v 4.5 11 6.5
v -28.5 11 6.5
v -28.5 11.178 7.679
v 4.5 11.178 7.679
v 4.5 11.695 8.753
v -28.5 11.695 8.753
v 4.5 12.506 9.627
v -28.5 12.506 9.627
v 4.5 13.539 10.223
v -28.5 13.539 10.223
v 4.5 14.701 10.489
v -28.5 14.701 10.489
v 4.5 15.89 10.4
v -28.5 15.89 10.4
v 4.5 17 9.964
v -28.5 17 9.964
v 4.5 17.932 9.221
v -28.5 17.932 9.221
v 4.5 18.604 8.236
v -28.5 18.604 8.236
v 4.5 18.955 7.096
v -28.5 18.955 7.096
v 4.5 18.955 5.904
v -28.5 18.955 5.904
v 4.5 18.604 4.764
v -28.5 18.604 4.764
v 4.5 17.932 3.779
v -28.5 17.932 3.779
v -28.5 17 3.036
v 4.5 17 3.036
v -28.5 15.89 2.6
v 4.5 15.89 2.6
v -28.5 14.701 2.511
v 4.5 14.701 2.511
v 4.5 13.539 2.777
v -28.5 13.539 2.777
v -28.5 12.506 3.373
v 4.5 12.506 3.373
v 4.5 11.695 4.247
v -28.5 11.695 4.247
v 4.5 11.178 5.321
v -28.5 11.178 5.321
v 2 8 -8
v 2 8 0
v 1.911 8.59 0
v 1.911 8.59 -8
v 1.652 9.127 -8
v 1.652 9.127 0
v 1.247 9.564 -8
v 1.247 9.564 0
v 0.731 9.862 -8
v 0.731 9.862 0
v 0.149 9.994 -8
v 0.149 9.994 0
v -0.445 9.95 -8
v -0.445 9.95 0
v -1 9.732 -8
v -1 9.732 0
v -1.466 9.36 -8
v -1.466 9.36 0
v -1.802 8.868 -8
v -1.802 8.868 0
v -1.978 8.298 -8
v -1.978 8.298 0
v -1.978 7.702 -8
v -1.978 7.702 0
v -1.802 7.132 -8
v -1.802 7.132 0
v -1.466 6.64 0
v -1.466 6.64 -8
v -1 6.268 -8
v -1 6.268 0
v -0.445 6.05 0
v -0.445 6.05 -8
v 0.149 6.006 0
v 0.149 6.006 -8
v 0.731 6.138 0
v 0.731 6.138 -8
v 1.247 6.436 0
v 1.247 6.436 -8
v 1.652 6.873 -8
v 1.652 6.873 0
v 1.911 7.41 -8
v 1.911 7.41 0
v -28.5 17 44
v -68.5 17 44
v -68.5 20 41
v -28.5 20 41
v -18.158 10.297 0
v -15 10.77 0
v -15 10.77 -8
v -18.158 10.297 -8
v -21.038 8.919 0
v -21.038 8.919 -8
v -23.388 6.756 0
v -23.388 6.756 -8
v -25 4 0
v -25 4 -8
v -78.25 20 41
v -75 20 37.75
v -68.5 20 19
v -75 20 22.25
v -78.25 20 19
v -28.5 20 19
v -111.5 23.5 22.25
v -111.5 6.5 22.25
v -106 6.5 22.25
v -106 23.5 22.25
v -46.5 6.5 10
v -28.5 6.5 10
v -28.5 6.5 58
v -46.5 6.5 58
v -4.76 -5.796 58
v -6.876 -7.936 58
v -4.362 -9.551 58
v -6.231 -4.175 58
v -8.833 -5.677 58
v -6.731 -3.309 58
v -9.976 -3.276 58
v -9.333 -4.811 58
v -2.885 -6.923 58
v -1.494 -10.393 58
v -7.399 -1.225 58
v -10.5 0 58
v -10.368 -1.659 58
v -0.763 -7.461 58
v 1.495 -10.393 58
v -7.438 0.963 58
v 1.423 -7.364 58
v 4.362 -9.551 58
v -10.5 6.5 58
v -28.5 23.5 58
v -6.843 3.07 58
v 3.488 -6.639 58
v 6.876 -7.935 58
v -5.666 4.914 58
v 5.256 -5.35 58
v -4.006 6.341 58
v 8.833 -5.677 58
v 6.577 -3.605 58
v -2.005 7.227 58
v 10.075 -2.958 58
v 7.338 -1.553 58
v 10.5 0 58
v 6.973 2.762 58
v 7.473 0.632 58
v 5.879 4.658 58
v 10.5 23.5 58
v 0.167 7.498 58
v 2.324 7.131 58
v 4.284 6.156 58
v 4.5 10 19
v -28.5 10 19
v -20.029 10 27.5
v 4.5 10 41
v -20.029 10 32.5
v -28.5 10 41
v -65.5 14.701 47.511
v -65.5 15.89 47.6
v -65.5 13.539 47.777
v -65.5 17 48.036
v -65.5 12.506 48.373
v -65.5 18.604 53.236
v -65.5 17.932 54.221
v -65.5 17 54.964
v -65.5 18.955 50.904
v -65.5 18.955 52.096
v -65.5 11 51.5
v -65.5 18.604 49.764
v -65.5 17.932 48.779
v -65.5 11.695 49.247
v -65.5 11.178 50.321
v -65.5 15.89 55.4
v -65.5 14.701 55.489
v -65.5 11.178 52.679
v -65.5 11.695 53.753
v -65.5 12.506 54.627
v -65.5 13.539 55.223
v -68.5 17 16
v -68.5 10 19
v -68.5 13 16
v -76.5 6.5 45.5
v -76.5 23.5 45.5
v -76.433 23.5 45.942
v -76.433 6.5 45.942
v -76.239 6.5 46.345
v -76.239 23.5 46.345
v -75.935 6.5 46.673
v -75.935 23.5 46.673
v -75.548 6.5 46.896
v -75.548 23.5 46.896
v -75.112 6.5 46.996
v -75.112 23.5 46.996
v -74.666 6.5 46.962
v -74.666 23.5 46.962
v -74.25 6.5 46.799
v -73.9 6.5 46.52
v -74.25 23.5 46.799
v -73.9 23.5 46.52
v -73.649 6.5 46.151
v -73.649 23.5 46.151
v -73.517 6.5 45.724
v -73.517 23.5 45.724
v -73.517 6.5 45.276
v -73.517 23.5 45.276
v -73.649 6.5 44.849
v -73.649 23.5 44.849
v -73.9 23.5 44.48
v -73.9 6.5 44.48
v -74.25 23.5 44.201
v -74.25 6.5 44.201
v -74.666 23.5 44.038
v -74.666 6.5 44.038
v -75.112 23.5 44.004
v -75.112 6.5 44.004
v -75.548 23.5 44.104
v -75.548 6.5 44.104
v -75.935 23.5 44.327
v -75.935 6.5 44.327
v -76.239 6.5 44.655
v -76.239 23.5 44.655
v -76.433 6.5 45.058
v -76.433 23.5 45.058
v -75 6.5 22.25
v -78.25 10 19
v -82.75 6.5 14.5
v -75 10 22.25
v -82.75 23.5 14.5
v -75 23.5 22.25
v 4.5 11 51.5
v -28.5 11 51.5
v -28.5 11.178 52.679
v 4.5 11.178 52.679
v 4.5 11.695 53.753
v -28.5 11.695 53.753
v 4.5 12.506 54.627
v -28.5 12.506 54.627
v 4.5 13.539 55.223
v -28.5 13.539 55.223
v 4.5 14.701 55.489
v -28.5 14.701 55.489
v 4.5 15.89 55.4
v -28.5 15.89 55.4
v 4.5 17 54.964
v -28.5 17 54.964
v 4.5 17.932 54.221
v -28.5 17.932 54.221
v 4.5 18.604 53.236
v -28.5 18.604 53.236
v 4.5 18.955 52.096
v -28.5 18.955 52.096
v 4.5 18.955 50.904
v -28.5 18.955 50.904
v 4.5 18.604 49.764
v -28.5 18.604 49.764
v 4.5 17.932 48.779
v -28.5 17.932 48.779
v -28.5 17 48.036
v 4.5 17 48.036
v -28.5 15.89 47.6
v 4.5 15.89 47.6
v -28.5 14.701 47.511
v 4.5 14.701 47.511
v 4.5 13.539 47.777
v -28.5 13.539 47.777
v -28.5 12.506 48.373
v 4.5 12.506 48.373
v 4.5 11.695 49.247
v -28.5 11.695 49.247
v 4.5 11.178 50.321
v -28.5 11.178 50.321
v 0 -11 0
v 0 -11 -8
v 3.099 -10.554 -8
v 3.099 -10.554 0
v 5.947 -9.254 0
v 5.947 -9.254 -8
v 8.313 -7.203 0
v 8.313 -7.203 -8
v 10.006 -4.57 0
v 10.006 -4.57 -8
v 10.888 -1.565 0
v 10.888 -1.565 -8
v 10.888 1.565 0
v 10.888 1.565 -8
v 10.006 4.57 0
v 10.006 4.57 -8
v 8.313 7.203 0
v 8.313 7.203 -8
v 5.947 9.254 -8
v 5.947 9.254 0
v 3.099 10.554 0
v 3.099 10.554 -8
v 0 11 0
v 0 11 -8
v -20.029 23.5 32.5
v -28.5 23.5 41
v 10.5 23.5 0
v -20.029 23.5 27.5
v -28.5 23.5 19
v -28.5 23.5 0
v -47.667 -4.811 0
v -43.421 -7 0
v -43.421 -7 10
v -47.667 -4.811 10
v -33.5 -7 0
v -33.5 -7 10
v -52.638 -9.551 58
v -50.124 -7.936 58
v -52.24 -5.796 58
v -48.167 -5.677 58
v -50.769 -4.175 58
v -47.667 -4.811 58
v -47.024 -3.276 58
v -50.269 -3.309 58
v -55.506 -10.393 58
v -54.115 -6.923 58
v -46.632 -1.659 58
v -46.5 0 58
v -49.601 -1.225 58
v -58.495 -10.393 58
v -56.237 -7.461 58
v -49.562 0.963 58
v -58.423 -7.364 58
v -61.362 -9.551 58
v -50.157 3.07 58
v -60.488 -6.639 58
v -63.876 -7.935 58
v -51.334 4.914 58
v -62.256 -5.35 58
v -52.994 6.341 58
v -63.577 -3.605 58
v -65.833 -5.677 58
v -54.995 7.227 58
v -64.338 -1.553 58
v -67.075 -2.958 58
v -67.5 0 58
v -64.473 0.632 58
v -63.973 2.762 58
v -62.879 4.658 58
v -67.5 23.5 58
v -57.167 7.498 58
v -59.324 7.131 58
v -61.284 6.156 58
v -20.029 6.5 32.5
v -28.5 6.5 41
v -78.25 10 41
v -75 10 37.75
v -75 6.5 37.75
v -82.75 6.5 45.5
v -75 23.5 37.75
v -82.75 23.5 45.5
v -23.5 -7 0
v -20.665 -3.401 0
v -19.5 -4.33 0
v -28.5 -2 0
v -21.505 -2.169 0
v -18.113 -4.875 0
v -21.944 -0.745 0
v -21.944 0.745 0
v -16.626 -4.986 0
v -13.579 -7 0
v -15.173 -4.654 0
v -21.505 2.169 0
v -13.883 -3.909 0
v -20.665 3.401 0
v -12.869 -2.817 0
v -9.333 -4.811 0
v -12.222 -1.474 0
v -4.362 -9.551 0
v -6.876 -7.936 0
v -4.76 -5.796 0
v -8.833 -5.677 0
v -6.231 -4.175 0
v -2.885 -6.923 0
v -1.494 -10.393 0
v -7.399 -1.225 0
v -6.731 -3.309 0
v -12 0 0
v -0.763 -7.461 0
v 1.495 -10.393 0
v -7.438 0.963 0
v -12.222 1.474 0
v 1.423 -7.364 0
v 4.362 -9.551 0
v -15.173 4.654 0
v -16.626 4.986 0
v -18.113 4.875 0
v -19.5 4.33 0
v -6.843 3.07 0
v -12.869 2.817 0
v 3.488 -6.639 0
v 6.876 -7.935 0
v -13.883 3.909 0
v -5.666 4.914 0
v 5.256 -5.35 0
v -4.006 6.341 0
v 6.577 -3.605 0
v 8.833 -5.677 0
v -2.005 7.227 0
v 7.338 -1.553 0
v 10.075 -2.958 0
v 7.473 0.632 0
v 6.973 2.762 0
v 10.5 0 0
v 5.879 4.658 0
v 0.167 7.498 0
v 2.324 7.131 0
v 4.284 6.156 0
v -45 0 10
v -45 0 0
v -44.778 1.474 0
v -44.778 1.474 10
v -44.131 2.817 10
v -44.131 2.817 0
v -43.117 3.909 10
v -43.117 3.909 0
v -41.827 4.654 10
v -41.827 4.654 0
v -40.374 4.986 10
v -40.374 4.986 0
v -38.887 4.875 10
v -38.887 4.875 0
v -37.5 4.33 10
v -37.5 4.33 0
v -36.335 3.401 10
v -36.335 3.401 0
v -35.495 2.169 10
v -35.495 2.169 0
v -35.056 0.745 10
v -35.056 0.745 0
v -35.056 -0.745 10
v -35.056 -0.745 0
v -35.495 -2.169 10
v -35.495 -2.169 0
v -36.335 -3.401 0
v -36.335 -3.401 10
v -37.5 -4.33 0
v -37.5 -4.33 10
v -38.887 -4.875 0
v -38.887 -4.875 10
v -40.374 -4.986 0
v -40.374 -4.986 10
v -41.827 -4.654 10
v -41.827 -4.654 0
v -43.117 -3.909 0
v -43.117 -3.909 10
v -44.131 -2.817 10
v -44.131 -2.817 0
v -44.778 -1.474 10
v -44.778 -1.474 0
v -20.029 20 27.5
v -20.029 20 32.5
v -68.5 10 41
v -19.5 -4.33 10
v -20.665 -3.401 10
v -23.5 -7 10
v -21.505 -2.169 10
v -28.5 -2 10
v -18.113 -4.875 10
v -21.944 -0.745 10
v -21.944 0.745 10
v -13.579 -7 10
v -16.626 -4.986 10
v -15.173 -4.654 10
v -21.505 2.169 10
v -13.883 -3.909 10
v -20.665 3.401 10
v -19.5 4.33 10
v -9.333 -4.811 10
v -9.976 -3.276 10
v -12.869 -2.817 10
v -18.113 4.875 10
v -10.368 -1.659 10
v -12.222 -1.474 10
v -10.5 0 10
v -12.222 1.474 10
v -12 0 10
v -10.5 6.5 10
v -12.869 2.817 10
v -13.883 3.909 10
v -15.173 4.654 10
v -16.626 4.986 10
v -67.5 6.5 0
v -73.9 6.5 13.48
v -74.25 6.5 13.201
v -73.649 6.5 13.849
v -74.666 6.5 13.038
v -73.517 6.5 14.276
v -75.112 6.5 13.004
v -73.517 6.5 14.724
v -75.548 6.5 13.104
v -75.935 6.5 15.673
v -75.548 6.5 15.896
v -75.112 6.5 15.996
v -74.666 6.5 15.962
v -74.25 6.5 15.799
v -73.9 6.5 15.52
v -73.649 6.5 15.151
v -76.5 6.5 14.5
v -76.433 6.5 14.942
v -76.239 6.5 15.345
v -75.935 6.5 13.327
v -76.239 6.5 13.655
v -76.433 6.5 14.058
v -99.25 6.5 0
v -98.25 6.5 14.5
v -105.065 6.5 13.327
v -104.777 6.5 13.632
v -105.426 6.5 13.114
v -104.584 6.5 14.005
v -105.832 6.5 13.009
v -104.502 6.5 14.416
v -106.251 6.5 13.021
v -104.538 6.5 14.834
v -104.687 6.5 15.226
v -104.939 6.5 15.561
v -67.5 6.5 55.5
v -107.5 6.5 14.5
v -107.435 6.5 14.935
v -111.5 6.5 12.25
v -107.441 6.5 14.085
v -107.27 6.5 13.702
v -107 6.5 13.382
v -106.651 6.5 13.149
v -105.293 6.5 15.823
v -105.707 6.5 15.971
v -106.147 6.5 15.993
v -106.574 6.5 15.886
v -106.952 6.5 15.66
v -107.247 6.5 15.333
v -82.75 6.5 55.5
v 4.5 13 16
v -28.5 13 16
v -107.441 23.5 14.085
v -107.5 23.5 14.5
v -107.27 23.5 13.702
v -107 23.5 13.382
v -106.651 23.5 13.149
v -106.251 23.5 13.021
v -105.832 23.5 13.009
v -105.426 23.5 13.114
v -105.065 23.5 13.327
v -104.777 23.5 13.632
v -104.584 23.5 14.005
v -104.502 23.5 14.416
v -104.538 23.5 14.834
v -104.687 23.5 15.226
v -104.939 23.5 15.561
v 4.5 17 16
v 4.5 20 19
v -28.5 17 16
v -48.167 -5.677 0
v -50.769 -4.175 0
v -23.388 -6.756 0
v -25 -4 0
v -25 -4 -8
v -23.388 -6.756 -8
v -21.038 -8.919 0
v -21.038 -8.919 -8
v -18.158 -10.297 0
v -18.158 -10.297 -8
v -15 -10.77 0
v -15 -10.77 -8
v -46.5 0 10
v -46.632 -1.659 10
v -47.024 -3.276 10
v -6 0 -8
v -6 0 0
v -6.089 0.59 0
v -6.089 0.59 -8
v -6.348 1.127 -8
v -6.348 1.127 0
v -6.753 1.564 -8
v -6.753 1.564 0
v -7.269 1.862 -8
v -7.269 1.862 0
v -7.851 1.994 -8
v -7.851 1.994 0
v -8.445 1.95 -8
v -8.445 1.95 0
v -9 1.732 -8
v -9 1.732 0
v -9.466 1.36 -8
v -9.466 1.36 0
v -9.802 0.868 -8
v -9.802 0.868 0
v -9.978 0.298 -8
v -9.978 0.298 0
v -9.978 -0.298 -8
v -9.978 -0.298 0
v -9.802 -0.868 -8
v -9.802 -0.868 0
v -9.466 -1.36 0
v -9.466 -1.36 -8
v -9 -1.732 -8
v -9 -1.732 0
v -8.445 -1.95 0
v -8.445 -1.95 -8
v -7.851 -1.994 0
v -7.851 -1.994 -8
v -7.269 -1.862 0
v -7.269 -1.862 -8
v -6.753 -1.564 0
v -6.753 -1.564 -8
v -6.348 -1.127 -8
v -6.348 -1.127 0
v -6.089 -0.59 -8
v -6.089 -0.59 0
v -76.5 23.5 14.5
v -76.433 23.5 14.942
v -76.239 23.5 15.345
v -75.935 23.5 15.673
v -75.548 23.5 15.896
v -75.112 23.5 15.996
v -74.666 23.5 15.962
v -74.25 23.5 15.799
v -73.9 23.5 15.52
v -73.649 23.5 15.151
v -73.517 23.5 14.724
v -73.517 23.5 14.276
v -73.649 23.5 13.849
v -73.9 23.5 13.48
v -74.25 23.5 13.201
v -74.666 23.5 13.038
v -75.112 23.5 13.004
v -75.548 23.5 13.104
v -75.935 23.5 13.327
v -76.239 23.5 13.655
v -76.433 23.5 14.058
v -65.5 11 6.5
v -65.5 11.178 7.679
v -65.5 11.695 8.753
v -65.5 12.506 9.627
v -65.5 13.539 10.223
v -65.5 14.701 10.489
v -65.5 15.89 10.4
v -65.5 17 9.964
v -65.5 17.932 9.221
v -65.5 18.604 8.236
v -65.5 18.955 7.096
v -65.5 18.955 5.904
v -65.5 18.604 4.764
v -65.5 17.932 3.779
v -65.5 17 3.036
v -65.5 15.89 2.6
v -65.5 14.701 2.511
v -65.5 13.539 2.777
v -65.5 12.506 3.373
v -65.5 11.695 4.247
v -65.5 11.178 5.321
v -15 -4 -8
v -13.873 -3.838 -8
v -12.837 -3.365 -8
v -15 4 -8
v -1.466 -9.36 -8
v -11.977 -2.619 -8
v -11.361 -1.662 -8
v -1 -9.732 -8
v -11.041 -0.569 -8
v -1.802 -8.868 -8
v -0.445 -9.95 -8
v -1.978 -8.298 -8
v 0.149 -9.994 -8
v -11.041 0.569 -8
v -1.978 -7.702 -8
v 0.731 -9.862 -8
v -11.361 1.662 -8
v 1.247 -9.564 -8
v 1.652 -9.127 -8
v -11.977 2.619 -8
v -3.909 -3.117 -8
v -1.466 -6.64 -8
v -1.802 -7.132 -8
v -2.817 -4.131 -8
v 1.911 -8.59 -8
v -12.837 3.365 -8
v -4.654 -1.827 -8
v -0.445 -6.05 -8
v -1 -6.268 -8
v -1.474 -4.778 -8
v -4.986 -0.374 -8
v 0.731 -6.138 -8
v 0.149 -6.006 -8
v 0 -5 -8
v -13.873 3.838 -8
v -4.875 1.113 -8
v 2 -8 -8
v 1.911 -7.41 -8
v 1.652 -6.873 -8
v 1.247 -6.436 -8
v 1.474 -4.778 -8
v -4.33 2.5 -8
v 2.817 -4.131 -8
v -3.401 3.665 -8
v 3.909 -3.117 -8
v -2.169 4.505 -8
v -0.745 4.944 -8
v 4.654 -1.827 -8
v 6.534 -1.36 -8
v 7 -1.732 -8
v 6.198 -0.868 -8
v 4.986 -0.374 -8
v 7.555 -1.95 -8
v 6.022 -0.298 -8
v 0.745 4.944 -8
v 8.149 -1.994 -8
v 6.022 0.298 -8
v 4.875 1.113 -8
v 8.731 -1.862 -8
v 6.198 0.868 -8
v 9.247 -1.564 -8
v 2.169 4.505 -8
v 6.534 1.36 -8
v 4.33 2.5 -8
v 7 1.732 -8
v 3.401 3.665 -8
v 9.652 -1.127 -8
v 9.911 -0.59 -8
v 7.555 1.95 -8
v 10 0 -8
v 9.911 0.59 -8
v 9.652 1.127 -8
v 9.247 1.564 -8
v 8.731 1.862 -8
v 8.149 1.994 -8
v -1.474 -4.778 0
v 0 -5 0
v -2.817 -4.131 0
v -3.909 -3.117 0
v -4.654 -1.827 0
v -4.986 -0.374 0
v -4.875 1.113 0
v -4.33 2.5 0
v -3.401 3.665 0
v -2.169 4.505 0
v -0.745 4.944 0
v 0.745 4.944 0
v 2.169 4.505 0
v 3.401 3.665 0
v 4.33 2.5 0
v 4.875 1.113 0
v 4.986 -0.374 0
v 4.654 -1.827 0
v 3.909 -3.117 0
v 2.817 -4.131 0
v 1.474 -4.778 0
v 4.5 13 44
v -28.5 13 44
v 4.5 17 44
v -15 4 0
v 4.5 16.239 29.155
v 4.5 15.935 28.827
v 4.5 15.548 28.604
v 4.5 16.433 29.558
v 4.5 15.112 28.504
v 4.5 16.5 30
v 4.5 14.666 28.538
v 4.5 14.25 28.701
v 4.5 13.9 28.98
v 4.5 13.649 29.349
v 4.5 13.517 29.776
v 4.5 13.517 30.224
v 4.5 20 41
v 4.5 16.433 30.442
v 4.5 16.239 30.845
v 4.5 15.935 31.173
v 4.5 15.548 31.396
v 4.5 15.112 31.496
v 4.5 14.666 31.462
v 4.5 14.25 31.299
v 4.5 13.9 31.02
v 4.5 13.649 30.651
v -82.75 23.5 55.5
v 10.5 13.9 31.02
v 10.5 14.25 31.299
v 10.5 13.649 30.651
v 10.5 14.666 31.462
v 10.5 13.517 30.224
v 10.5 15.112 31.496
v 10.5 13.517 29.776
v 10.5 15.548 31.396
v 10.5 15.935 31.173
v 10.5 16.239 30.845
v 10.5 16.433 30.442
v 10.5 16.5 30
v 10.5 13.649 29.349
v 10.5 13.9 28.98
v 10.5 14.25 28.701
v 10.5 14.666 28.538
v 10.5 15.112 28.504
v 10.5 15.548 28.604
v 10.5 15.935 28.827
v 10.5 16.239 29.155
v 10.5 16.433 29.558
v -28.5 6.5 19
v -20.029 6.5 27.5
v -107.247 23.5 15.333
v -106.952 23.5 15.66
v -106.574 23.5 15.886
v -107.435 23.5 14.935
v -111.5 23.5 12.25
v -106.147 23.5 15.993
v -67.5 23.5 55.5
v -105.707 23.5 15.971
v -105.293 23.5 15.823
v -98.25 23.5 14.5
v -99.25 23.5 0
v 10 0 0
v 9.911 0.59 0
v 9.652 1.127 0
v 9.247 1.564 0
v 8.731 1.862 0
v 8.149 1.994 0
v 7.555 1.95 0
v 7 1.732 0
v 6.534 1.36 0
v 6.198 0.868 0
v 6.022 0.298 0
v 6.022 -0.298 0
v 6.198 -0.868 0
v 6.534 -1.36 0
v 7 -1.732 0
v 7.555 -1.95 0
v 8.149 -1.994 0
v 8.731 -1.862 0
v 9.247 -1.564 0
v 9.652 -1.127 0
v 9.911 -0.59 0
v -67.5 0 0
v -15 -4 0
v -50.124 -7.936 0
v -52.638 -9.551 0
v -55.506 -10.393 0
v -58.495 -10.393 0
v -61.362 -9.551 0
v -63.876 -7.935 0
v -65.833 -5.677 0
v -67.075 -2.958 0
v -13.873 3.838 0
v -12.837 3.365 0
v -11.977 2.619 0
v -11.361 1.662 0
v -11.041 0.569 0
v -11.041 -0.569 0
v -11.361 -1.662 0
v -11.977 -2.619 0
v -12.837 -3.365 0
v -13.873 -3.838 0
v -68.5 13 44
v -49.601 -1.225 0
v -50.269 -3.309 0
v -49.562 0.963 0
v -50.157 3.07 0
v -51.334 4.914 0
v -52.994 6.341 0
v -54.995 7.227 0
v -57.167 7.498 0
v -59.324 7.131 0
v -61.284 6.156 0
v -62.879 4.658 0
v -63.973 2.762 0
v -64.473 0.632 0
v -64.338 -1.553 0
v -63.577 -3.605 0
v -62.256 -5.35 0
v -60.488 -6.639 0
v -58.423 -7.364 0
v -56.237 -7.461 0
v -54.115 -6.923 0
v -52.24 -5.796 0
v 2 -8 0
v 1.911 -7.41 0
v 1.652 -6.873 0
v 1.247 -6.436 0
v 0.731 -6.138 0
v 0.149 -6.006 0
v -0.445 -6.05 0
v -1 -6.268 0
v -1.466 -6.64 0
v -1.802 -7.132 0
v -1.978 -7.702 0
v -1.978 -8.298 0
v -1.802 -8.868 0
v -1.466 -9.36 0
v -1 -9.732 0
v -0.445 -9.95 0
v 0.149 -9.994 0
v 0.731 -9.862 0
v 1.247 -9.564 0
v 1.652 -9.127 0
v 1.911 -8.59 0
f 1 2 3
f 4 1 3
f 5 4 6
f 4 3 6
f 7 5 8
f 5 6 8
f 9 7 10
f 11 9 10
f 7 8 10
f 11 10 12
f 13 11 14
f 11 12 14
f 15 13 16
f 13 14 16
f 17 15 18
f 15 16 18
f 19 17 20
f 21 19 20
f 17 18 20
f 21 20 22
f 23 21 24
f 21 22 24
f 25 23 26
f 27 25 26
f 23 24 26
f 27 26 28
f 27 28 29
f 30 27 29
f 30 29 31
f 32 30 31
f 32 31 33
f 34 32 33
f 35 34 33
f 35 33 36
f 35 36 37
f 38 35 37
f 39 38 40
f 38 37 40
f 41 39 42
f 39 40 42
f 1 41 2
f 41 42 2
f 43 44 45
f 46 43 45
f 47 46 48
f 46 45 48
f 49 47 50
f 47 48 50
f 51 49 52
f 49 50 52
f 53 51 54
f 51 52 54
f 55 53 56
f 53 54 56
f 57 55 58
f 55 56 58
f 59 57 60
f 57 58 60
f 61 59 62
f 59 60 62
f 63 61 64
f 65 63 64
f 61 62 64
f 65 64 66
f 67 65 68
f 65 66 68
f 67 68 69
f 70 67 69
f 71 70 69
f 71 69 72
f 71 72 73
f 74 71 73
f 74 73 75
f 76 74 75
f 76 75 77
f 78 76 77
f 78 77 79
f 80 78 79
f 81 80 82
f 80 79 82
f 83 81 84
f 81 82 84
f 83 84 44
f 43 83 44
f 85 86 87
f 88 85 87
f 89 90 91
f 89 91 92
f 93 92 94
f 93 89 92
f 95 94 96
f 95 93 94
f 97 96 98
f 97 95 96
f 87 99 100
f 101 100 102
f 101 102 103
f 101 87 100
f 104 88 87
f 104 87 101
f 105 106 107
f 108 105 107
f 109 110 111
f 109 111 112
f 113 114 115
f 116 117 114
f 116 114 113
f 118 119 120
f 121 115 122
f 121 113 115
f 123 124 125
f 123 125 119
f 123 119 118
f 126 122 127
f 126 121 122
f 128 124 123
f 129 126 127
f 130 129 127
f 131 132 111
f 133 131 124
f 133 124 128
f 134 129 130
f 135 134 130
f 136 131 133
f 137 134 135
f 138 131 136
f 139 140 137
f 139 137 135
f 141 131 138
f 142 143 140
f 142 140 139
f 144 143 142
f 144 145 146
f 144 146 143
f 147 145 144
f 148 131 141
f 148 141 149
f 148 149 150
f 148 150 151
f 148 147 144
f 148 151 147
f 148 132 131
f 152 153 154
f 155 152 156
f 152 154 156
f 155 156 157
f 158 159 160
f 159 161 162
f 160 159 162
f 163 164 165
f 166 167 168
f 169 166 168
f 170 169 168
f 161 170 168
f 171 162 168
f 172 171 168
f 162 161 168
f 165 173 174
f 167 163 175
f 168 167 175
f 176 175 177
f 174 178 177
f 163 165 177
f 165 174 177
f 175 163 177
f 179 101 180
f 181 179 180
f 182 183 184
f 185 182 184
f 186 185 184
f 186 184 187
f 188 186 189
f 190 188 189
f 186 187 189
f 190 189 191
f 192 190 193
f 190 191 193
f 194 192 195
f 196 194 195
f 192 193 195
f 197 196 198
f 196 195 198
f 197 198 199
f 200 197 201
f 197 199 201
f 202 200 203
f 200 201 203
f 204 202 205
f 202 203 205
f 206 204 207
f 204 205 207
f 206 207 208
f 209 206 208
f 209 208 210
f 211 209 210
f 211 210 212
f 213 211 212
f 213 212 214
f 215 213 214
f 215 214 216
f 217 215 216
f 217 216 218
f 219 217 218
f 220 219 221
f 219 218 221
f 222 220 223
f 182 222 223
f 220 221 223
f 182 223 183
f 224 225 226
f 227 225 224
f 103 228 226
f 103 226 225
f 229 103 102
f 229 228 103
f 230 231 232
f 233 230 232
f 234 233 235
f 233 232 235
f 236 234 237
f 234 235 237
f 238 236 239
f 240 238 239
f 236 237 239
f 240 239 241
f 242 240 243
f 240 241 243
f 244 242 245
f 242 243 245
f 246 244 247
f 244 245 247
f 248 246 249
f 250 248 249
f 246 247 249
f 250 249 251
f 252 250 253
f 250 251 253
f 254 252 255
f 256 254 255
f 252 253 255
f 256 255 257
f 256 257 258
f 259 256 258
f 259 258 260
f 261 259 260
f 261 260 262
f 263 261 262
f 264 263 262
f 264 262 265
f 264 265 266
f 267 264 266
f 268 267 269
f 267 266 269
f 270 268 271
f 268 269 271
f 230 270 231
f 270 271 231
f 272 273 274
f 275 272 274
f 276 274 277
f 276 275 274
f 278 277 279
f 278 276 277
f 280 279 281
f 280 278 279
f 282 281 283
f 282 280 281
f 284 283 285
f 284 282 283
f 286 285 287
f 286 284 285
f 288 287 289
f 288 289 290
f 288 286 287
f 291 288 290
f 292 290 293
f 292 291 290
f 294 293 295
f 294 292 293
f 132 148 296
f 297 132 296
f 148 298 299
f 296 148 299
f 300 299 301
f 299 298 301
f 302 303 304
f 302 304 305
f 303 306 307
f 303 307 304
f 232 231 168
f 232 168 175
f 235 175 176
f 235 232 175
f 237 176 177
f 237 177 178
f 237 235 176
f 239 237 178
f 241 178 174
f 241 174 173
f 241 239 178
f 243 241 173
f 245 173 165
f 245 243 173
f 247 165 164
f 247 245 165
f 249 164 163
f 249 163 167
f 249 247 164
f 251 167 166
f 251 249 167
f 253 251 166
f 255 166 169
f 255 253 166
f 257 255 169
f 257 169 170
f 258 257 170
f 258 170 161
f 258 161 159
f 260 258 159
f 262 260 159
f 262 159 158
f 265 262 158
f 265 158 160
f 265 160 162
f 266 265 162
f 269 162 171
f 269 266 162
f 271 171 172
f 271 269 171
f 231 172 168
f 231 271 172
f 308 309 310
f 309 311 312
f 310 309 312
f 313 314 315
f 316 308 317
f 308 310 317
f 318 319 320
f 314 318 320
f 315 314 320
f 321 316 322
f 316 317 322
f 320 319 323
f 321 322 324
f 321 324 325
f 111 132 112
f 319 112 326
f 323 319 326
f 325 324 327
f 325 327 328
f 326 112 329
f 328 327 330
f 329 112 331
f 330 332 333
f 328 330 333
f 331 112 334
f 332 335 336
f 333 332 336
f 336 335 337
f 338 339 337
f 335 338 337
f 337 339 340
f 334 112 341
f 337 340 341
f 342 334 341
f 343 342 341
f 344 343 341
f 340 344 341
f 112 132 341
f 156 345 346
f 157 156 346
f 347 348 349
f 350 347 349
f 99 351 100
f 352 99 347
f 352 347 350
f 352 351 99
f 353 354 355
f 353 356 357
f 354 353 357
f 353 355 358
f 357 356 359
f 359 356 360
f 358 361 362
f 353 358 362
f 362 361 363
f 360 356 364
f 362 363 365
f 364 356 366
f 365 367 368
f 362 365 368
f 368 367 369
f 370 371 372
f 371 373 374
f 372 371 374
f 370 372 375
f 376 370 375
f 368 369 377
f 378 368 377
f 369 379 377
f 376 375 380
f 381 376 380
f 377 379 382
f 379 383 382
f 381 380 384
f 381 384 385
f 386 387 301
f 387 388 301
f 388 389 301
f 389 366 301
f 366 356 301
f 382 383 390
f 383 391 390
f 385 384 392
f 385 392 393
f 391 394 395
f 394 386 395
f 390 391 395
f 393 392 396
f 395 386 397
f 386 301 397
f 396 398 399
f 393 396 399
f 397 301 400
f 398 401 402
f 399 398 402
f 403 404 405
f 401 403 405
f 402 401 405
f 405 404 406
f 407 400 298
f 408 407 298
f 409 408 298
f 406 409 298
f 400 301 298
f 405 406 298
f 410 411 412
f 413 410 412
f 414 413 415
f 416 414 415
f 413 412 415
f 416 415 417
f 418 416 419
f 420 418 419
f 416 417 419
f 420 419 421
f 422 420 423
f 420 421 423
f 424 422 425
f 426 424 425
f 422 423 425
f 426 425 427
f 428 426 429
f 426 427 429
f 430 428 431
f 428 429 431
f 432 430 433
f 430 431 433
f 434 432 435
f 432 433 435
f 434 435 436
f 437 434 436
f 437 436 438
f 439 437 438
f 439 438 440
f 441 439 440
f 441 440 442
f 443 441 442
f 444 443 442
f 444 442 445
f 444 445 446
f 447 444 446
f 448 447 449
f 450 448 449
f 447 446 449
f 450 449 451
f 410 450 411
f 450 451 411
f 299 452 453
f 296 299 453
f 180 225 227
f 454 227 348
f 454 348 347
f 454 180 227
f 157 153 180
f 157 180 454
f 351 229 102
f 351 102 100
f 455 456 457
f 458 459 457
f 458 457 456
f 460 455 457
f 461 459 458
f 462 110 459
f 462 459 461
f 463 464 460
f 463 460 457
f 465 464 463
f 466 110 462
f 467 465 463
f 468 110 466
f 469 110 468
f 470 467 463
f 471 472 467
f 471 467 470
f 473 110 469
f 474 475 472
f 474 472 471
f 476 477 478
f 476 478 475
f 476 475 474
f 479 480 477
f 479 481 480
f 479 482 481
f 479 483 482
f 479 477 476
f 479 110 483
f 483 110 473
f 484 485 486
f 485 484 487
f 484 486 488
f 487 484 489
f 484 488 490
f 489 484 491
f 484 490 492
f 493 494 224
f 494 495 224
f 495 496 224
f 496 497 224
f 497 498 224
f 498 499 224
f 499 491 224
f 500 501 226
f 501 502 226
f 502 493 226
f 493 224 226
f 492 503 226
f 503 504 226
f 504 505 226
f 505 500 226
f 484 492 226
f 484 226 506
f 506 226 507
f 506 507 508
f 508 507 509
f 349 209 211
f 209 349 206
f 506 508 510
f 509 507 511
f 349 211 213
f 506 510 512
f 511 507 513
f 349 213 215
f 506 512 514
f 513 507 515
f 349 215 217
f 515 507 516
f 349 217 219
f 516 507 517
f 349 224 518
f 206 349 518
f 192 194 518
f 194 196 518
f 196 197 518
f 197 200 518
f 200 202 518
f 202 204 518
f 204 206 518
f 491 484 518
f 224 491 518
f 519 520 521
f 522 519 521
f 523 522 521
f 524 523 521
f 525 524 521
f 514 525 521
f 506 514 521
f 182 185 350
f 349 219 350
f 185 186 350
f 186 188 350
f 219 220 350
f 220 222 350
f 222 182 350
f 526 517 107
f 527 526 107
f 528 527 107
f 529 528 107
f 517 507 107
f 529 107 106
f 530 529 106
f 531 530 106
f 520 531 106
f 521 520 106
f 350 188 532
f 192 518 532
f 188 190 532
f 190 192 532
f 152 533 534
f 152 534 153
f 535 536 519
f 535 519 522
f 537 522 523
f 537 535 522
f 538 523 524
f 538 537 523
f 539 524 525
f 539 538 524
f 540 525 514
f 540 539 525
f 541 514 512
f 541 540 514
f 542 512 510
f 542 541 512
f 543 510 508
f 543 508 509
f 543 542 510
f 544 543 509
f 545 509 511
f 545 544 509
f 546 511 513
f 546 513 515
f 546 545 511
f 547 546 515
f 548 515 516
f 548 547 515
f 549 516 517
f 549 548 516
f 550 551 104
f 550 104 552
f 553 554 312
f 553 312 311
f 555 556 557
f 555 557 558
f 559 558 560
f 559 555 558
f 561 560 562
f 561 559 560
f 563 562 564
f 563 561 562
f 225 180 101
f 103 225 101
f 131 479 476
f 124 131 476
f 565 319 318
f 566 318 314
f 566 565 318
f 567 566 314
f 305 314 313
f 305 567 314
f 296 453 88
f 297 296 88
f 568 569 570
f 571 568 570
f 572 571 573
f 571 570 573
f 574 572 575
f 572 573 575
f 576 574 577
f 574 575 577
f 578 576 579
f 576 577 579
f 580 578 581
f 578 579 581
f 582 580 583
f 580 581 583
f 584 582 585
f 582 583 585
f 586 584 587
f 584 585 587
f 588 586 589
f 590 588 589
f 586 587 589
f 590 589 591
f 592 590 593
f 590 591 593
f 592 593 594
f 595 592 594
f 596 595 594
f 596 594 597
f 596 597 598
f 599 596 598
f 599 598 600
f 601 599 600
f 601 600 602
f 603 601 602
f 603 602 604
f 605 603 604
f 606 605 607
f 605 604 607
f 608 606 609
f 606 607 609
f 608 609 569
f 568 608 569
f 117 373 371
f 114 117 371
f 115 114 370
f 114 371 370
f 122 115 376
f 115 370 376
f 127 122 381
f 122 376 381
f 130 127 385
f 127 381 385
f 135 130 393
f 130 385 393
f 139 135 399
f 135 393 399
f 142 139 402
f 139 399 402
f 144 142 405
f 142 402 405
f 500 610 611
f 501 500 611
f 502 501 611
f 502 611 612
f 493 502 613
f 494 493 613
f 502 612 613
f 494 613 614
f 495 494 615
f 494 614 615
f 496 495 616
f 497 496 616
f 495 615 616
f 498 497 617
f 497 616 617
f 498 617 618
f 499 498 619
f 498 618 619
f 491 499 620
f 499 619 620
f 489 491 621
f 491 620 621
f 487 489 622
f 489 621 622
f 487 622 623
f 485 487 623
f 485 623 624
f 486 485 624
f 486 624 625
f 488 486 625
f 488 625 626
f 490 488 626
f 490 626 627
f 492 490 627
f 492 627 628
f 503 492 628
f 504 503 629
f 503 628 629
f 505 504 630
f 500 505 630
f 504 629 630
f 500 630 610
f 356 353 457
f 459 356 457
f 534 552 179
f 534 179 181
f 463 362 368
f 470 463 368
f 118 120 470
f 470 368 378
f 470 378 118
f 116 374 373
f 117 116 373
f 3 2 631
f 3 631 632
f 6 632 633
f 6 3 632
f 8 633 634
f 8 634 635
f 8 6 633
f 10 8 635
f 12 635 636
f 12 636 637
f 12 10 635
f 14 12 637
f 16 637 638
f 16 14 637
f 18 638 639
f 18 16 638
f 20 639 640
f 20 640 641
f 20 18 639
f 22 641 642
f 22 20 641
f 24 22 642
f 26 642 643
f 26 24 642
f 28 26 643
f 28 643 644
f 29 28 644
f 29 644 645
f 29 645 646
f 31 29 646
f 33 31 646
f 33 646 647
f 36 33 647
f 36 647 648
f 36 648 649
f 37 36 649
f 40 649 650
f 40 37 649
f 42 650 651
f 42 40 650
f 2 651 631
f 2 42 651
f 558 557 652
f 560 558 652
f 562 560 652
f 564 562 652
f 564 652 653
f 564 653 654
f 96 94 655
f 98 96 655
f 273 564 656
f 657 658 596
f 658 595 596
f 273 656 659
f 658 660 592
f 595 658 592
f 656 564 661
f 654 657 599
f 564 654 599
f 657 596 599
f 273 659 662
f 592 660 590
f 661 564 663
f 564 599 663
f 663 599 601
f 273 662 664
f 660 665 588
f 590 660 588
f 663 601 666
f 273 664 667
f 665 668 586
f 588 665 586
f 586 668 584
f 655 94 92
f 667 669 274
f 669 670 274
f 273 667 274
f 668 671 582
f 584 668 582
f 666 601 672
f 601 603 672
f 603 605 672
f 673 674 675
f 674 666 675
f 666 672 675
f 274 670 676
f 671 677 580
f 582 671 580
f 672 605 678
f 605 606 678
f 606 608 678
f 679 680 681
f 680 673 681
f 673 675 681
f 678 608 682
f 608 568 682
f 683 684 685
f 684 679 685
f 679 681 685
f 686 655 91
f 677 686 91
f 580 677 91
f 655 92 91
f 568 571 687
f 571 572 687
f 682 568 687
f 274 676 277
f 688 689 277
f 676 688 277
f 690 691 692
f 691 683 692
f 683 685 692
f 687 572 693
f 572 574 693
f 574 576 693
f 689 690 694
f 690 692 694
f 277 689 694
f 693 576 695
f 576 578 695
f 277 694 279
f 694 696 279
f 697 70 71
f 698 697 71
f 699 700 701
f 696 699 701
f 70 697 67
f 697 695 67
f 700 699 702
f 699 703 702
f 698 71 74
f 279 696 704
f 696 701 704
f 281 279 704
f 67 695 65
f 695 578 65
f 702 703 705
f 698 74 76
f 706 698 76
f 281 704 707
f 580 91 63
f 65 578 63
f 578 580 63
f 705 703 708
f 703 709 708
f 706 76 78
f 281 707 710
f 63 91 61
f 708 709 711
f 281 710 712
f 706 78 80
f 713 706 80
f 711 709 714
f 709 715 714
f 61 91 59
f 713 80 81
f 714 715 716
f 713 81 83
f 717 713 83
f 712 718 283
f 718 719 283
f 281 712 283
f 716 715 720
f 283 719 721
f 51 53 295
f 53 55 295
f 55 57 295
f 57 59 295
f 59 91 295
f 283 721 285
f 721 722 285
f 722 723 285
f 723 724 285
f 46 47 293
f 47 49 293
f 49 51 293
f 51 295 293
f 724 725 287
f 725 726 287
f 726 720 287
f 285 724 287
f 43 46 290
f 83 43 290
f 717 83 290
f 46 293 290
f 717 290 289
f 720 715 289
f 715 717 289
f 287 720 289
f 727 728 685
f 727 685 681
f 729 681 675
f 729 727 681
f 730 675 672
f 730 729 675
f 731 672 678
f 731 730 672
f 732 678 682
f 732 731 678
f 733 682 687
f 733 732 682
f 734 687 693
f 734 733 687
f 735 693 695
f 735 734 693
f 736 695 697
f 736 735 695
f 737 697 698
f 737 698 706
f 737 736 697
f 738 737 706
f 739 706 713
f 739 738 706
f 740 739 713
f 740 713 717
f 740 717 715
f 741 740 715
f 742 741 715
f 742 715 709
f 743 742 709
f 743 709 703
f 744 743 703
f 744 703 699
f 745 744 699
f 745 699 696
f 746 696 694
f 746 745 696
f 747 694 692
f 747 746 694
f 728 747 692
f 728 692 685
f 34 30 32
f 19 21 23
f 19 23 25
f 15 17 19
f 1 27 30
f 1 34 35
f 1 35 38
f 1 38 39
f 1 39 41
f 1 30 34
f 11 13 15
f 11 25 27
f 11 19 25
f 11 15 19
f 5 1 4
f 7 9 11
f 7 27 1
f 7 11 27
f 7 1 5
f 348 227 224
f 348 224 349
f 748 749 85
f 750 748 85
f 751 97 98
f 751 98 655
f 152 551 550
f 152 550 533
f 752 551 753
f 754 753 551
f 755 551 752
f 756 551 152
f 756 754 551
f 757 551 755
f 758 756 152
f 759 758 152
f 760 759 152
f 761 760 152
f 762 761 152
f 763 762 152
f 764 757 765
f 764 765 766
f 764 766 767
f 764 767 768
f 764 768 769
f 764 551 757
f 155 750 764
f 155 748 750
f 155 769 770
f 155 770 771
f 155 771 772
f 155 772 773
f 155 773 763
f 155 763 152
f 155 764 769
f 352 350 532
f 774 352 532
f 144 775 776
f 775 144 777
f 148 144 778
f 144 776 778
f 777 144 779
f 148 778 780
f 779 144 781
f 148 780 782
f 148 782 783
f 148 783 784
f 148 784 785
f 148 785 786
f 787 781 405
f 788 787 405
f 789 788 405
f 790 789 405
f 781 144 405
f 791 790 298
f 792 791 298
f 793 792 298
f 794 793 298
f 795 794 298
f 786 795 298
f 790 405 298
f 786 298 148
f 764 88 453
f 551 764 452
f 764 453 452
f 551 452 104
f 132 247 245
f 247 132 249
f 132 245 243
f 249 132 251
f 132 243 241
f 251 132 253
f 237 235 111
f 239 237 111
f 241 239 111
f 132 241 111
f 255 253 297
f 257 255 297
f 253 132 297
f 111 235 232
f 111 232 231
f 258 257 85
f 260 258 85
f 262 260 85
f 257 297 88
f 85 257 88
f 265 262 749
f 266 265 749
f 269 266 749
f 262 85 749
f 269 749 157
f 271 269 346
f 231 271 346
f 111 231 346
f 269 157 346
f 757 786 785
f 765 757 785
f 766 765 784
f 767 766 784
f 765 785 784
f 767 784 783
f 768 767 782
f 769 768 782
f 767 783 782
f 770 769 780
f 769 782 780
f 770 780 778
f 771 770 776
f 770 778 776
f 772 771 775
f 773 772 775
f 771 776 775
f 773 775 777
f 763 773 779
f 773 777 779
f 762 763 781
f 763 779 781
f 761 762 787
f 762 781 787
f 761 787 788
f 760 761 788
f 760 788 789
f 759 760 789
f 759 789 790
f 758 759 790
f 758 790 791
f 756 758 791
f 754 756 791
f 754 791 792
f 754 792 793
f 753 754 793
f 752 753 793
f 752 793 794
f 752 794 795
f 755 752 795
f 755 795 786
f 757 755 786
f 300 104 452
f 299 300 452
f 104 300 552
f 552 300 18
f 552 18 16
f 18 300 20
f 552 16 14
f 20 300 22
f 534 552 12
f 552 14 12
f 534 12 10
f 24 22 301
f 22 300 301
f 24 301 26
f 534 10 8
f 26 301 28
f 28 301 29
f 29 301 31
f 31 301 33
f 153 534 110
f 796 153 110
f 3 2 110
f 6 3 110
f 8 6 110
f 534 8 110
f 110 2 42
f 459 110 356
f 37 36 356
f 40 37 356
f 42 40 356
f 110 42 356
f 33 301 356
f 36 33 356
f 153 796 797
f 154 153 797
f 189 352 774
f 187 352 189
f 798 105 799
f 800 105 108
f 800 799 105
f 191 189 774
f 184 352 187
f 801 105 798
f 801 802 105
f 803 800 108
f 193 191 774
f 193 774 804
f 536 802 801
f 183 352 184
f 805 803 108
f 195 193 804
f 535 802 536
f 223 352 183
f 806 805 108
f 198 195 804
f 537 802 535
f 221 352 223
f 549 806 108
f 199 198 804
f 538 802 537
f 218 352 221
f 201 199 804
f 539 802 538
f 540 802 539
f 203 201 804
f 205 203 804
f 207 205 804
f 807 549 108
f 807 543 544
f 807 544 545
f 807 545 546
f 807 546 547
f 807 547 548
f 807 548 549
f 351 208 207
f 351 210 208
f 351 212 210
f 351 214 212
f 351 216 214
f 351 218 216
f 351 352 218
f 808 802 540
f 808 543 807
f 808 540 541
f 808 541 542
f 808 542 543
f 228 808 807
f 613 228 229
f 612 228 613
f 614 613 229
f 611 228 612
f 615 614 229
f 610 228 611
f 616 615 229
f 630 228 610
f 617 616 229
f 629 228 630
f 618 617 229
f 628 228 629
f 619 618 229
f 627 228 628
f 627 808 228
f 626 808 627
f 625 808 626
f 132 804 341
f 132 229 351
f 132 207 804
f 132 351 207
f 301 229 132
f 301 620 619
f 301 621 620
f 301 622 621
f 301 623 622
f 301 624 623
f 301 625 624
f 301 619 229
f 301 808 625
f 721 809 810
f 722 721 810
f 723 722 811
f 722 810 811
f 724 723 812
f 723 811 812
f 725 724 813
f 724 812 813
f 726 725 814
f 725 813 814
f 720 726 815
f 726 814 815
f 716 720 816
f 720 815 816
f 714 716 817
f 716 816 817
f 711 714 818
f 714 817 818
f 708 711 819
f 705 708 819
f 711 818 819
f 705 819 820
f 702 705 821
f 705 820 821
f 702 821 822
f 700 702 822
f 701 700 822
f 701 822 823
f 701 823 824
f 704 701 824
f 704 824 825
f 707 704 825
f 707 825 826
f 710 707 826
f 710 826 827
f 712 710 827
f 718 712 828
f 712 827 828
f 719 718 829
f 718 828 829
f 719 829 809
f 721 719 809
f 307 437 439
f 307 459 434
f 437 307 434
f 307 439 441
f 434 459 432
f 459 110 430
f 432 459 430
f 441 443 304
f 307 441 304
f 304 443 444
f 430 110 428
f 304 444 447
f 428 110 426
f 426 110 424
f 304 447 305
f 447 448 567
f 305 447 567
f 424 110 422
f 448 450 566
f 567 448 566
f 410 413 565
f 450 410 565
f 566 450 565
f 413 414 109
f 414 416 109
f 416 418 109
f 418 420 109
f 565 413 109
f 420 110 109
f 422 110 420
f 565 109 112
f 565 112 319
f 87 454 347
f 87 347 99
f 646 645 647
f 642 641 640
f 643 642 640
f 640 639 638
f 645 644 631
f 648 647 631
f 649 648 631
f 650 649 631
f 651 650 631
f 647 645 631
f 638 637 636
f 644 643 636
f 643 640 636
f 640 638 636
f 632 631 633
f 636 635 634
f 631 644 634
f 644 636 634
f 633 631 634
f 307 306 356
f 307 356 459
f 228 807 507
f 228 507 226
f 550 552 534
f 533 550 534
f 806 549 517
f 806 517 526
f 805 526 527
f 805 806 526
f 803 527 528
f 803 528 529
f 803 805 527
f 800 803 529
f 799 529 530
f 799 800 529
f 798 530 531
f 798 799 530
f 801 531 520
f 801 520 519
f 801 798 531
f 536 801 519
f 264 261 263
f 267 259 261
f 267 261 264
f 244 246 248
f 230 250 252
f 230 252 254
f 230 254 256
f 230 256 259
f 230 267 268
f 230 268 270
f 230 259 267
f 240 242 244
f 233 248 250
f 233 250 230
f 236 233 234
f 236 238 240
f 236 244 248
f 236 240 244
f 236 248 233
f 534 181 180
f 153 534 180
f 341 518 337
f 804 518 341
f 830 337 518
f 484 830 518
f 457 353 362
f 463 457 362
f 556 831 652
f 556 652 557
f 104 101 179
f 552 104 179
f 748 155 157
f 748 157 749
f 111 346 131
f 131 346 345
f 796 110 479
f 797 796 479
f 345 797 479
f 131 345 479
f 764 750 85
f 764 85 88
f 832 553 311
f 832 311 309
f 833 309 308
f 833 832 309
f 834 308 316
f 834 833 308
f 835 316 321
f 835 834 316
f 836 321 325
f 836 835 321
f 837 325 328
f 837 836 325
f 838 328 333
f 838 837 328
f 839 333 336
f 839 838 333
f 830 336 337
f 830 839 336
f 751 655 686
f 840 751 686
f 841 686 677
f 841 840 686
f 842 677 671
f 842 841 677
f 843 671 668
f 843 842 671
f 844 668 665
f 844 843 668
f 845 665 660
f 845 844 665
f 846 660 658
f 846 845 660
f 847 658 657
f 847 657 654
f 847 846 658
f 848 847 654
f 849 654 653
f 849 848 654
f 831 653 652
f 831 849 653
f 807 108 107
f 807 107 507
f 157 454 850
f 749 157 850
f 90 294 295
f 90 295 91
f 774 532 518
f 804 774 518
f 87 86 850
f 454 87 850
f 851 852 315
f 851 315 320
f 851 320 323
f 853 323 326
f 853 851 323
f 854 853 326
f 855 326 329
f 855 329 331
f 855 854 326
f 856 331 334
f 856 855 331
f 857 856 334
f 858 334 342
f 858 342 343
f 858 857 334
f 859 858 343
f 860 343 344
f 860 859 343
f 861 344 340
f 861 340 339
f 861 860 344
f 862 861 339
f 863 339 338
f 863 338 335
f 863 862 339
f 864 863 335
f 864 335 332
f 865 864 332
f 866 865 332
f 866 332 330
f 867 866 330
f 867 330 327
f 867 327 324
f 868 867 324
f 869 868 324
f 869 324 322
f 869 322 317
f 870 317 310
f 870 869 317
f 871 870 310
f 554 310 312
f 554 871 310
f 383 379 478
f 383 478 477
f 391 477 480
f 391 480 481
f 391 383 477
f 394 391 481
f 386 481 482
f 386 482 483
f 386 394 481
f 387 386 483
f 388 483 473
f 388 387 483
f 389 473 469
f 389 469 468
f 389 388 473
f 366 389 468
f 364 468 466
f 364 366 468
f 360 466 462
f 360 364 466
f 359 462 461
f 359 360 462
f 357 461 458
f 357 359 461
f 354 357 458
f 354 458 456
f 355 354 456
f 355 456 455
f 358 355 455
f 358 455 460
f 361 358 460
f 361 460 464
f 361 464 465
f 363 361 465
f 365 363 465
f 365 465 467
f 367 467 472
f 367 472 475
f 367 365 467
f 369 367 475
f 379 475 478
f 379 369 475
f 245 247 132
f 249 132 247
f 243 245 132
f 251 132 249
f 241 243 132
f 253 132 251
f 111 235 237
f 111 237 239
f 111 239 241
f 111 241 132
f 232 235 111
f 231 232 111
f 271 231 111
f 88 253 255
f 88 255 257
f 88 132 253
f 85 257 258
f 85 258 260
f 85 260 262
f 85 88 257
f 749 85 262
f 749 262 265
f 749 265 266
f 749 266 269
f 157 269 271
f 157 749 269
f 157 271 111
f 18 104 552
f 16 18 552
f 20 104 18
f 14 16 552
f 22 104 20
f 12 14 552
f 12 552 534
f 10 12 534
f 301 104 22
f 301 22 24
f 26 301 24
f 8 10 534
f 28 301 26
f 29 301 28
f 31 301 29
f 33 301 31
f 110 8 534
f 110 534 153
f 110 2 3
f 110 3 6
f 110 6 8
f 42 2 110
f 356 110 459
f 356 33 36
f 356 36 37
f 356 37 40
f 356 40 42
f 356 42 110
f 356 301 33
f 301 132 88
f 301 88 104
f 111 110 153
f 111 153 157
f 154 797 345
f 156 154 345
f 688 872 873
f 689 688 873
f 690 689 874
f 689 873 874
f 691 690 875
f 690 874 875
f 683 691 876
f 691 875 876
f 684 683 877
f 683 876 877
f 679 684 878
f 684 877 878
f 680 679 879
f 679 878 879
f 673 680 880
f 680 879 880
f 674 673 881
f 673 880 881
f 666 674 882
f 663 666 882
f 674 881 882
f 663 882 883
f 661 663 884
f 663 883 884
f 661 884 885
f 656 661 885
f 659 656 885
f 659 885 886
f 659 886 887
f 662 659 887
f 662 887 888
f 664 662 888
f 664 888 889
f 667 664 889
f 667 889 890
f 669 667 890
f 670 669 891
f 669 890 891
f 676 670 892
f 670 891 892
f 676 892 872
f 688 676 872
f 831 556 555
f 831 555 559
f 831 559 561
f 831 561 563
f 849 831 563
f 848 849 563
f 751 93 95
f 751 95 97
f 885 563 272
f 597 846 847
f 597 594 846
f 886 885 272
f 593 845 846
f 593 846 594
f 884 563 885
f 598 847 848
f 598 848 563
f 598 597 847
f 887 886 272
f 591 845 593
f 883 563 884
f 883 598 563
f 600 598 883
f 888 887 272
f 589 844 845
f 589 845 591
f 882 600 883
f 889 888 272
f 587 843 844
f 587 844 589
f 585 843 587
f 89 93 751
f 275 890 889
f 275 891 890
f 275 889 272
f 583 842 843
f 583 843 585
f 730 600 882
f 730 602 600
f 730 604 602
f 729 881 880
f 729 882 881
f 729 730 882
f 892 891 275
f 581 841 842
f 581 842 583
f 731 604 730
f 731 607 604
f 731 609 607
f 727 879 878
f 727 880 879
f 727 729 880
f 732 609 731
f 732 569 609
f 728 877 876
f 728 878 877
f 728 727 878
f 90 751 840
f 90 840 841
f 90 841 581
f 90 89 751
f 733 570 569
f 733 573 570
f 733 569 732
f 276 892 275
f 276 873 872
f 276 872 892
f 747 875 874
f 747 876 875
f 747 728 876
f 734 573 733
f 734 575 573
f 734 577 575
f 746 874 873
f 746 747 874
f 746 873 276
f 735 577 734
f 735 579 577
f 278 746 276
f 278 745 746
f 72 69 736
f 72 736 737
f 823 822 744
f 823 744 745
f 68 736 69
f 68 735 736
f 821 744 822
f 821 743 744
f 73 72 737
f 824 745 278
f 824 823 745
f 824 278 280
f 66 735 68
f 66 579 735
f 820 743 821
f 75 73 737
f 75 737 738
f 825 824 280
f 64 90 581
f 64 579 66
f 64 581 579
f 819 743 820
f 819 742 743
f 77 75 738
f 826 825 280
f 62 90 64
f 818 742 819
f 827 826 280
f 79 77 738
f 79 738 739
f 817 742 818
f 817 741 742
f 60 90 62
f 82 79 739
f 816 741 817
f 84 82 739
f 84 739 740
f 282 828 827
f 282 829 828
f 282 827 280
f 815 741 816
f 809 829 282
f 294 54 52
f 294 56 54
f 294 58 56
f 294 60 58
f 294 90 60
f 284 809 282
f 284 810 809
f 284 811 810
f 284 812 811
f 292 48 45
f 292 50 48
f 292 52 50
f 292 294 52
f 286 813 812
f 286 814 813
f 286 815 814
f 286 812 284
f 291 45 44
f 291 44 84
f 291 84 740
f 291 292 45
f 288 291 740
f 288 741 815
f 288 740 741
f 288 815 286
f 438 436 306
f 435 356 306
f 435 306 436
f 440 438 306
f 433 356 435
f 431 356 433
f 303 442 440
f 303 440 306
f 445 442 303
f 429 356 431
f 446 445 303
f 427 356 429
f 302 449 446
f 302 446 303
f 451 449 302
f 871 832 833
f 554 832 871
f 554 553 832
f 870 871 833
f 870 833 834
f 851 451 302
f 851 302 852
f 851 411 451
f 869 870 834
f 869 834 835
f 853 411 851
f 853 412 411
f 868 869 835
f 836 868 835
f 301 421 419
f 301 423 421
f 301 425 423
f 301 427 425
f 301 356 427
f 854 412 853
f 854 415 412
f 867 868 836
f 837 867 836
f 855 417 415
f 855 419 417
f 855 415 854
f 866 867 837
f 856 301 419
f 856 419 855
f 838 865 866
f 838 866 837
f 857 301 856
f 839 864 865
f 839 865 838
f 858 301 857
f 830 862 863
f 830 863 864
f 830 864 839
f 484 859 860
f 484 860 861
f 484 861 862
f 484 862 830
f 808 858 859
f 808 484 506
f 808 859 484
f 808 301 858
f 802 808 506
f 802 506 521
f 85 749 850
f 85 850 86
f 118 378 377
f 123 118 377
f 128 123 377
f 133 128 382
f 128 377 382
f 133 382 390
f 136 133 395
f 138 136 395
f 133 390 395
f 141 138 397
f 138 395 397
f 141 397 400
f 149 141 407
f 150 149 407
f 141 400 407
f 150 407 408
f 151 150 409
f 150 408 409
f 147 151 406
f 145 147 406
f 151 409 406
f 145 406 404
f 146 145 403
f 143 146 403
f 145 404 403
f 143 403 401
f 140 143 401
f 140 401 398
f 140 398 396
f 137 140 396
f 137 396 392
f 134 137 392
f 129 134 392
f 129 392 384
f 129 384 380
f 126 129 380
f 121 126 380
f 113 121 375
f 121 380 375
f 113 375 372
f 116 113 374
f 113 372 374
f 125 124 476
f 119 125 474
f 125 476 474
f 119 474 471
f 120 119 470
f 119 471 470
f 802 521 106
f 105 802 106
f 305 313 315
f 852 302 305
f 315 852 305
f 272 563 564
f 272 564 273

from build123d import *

# Parameters (mm, degrees)
F1_DEPTH  = 58
F3_R      = 5
F4_DEPTH  = 10
F5_SIZE   = 5
F2_R      = 4
F7_DEPTH  = 33
F8_R      = 1.5
F9_DEPTH  = 78.001
F10_DEPTH = 37
F11_R     = 1.5
F12_DEPTH = 17
F13_DEPTH = 40
F14_W     = 10
F14_H     = 22
F15_REACH = 67.1670919472
F17_DEPTH = 17.001
F18_R     = 2
F19_DEPTH = 8


with BuildPart() as f1:
    # F0 (on Top) → F1 (new body)
    with BuildSketch(Plane.XY):
        with BuildLine():
            Line((-10.5, 6.5), (-10.5, 0))
            ThreePointArc((-10.5, 0), (-10.2040674771, -2.4752791606), (-9.3329510623, -4.811031539))
            Line((-9.3329510623, -4.811031539), (-6.7307406984, -3.3086446849))
            ThreePointArc((-6.7307406984, -3.3086446849), (6.4951905284, 3.75), (-6.2307406984, -4.1746700887))
            Line((-6.2307406984, -4.1746700887), (-8.8329510623, -5.6770569427))
            ThreePointArc((-8.8329510623, -5.6770569427), (2.958379104, -10.0746212374), (10.5, 0))
            Line((10.5, 0), (10.5, 23.5))
            Line((10.5, 23.5), (-28.5, 23.5))
            Line((-28.5, 23.5), (-28.5, 6.5))
            Line((-28.5, 6.5), (-10.5, 6.5))
        make_face()
    extrude(amount=F1_DEPTH)

    # F3 (on Top) → F4 (join)
    with BuildSketch(Plane.XY):
        with BuildLine():
            Line((-10.5, 0), (-10.5, 6.5))
            Line((-10.5, 6.5), (-28.5, 6.5))
            Line((-28.5, 6.5), (-28.5, -7))
            Line((-28.5, -7), (-13.5793450754, -7))
            Line((-13.5793450754, -7), (-9.3329510623, -4.811031539))
            ThreePointArc((-9.3329510623, -4.811031539), (-10.2040674771, -2.4752791606), (-10.5, 0))
        make_face()
        with Locations((-17, 0)):
            Circle(F3_R, mode=Mode.SUBTRACT)
    extrude(amount=F4_DEPTH)

    # F5
    f5_edges = [f1.edges().sort_by_distance(p)[0] for p in [
        (-28.5, -7, 5),
    ]]
    chamfer(f5_edges, length=F5_SIZE)


with BuildPart() as f6_1:
    # F6: instance of F1
    add(f1.part.mirror(Plane(origin=(-28.5, 13.9880952381, 27.0952380952), x_dir=(0, -1, 0), z_dir=(-1, 0, 0))))


with BuildPart() as f1_1:
    add(f1.part)

    # F2 (on face) → F7 (cut)
    with BuildSketch(Plane(origin=(-28.5, 0, 0), x_dir=(0, -1, 0), z_dir=(-1, 0, 0))):
        Polygon((-17, 44), (-20, 41), (-20, 19), (-17, 16), (-13, 16), (-10, 19), (-10, 41), (-13, 44), align=None)
        with Locations((-15, 6.5)):
            Circle(F2_R)
        with Locations((-15, 51.5)):
            Circle(F2_R)
    extrude(amount=-F7_DEPTH, mode=Mode.SUBTRACT)


with BuildPart() as f9_tool:
    # F8 (on face) → F9 (new body, through all)
    with BuildSketch(Plane.YZ.offset(10.5)):
        with Locations((15, 30)):
            Circle(F8_R)
    extrude(amount=-F9_DEPTH)


with BuildPart() as f1_2:
    add(f1_1.part)

    # F9: cut by f9_tool
    add(f9_tool.part, mode=Mode.SUBTRACT)

    # F16 (on face) → F17 (cut, through all)
    with BuildSketch(Plane.XZ.offset(-6.5)):
        Polygon((-20.029462827, 32.5), (-28.5, 41), (-28.5, 19), (-20.029462827, 27.5), align=None)
    extrude(amount=-F17_DEPTH, mode=Mode.SUBTRACT)


with BuildPart() as f6_1_1:
    add(f6_1.part)

    # F9: cut by f9_tool
    add(f9_tool.part, mode=Mode.SUBTRACT)

    # F2 (on face) → F10 (cut)
    with BuildSketch(Plane(origin=(-28.5, 0, 0), x_dir=(0, -1, 0), z_dir=(-1, 0, 0))):
        with Locations((-15, 51.5)):
            Circle(F2_R)
        with Locations((-15, 6.5)):
            Circle(F2_R)
    extrude(amount=F10_DEPTH, mode=Mode.SUBTRACT)

    # F11 (on face) → F12 (join)
    with BuildSketch(Plane(origin=(0, 23.5, 0), x_dir=(-1, 0, 0), z_dir=(0, 1, 0))):
        Polygon((67.5, 55.5), (67.5, 0), (99.25, 0), (111.5, 12.25), (111.5, 22.25), (106, 22.25), (102.125, 18.375), (98.25, 14.5), (82.75, 14.5), (75, 22.25), (75, 37.75), (82.75, 45.5), (82.75, 55.5), align=None)
        with Locations((75, 14.5)):
            Circle(F11_R, mode=Mode.SUBTRACT)
        with BuildLine():
            ThreePointArc((107.5, 14.5), (105.4259748515, 13.1141807012), (104.9393398282, 15.5606601718))
            ThreePointArc((104.9393398282, 15.5606601718), (106.5740251485, 15.8858192988), (107.5, 14.5))
        make_face(mode=Mode.SUBTRACT)
        with Locations((75, 45.5)):
            Circle(F11_R, mode=Mode.SUBTRACT)
    extrude(amount=-F12_DEPTH)

    # F2 (on face) → F13 (cut)
    with BuildSketch(Plane(origin=(-28.5, 0, 0), x_dir=(0, -1, 0), z_dir=(-1, 0, 0))):
        Polygon((-17, 44), (-20, 41), (-20, 19), (-17, 16), (-13, 16), (-10, 19), (-10, 41), (-13, 44), align=None)
    extrude(amount=F13_DEPTH, mode=Mode.SUBTRACT)

    f15_end = Plane(origin=(-102.125, 15, 18.375), x_dir=(0.7071067812, 0, -0.7071067812), z_dir=(0.7071067812, 0, 0.7071067812))
    # F14 (on face) → F15 (cut, up to a plane its end follows)
    with BuildSketch(Plane.YZ.offset(-68.5)):
        with Locations((15, 30)):
            Rectangle(F14_W, F14_H)
    f15_long = extrude(amount=-F15_REACH, mode=Mode.PRIVATE)
    add(split(f15_long, bisect_by=f15_end, keep=Keep.TOP, mode=Mode.PRIVATE), mode=Mode.SUBTRACT)


with BuildPart() as f19:
    # F18 (on Top) → F19 (new body)
    with BuildSketch(Plane.XY):
        with BuildLine():
            ThreePointArc((-15, 4), (-11, 0), (-15, -4))
            Line((-15, -4), (-25, -4))
            ThreePointArc((-25, -4), (-21.0381570675, -8.9185570149), (-15, -10.7703296143))
            Line((-15, -10.7703296143), (0, -11))
            ThreePointArc((0, -11), (11, 0), (0, 11))
            Line((0, 11), (-15, 10.7703296143))
            ThreePointArc((-15, 10.7703296143), (-21.0381570675, 8.9185570149), (-25, 4))
            Line((-25, 4), (-15, 4))
        make_face()
        with Locations((0, -8)):
            Circle(F18_R, mode=Mode.SUBTRACT)
        with Locations((-8, 0)):
            Circle(F18_R, mode=Mode.SUBTRACT)
        with BuildLine():
            ThreePointArc((0, 5), (5, 0), (0, -5))
            ThreePointArc((0, -5), (-5, 0), (0, 5))
        make_face(mode=Mode.SUBTRACT)
        with Locations((8, 0)):
            Circle(F18_R, mode=Mode.SUBTRACT)
        with Locations((0, 8)):
            Circle(F18_R, mode=Mode.SUBTRACT)
    extrude(amount=-F19_DEPTH)


solid = Compound([f1_2.part, f6_1_1.part, f19.part])
